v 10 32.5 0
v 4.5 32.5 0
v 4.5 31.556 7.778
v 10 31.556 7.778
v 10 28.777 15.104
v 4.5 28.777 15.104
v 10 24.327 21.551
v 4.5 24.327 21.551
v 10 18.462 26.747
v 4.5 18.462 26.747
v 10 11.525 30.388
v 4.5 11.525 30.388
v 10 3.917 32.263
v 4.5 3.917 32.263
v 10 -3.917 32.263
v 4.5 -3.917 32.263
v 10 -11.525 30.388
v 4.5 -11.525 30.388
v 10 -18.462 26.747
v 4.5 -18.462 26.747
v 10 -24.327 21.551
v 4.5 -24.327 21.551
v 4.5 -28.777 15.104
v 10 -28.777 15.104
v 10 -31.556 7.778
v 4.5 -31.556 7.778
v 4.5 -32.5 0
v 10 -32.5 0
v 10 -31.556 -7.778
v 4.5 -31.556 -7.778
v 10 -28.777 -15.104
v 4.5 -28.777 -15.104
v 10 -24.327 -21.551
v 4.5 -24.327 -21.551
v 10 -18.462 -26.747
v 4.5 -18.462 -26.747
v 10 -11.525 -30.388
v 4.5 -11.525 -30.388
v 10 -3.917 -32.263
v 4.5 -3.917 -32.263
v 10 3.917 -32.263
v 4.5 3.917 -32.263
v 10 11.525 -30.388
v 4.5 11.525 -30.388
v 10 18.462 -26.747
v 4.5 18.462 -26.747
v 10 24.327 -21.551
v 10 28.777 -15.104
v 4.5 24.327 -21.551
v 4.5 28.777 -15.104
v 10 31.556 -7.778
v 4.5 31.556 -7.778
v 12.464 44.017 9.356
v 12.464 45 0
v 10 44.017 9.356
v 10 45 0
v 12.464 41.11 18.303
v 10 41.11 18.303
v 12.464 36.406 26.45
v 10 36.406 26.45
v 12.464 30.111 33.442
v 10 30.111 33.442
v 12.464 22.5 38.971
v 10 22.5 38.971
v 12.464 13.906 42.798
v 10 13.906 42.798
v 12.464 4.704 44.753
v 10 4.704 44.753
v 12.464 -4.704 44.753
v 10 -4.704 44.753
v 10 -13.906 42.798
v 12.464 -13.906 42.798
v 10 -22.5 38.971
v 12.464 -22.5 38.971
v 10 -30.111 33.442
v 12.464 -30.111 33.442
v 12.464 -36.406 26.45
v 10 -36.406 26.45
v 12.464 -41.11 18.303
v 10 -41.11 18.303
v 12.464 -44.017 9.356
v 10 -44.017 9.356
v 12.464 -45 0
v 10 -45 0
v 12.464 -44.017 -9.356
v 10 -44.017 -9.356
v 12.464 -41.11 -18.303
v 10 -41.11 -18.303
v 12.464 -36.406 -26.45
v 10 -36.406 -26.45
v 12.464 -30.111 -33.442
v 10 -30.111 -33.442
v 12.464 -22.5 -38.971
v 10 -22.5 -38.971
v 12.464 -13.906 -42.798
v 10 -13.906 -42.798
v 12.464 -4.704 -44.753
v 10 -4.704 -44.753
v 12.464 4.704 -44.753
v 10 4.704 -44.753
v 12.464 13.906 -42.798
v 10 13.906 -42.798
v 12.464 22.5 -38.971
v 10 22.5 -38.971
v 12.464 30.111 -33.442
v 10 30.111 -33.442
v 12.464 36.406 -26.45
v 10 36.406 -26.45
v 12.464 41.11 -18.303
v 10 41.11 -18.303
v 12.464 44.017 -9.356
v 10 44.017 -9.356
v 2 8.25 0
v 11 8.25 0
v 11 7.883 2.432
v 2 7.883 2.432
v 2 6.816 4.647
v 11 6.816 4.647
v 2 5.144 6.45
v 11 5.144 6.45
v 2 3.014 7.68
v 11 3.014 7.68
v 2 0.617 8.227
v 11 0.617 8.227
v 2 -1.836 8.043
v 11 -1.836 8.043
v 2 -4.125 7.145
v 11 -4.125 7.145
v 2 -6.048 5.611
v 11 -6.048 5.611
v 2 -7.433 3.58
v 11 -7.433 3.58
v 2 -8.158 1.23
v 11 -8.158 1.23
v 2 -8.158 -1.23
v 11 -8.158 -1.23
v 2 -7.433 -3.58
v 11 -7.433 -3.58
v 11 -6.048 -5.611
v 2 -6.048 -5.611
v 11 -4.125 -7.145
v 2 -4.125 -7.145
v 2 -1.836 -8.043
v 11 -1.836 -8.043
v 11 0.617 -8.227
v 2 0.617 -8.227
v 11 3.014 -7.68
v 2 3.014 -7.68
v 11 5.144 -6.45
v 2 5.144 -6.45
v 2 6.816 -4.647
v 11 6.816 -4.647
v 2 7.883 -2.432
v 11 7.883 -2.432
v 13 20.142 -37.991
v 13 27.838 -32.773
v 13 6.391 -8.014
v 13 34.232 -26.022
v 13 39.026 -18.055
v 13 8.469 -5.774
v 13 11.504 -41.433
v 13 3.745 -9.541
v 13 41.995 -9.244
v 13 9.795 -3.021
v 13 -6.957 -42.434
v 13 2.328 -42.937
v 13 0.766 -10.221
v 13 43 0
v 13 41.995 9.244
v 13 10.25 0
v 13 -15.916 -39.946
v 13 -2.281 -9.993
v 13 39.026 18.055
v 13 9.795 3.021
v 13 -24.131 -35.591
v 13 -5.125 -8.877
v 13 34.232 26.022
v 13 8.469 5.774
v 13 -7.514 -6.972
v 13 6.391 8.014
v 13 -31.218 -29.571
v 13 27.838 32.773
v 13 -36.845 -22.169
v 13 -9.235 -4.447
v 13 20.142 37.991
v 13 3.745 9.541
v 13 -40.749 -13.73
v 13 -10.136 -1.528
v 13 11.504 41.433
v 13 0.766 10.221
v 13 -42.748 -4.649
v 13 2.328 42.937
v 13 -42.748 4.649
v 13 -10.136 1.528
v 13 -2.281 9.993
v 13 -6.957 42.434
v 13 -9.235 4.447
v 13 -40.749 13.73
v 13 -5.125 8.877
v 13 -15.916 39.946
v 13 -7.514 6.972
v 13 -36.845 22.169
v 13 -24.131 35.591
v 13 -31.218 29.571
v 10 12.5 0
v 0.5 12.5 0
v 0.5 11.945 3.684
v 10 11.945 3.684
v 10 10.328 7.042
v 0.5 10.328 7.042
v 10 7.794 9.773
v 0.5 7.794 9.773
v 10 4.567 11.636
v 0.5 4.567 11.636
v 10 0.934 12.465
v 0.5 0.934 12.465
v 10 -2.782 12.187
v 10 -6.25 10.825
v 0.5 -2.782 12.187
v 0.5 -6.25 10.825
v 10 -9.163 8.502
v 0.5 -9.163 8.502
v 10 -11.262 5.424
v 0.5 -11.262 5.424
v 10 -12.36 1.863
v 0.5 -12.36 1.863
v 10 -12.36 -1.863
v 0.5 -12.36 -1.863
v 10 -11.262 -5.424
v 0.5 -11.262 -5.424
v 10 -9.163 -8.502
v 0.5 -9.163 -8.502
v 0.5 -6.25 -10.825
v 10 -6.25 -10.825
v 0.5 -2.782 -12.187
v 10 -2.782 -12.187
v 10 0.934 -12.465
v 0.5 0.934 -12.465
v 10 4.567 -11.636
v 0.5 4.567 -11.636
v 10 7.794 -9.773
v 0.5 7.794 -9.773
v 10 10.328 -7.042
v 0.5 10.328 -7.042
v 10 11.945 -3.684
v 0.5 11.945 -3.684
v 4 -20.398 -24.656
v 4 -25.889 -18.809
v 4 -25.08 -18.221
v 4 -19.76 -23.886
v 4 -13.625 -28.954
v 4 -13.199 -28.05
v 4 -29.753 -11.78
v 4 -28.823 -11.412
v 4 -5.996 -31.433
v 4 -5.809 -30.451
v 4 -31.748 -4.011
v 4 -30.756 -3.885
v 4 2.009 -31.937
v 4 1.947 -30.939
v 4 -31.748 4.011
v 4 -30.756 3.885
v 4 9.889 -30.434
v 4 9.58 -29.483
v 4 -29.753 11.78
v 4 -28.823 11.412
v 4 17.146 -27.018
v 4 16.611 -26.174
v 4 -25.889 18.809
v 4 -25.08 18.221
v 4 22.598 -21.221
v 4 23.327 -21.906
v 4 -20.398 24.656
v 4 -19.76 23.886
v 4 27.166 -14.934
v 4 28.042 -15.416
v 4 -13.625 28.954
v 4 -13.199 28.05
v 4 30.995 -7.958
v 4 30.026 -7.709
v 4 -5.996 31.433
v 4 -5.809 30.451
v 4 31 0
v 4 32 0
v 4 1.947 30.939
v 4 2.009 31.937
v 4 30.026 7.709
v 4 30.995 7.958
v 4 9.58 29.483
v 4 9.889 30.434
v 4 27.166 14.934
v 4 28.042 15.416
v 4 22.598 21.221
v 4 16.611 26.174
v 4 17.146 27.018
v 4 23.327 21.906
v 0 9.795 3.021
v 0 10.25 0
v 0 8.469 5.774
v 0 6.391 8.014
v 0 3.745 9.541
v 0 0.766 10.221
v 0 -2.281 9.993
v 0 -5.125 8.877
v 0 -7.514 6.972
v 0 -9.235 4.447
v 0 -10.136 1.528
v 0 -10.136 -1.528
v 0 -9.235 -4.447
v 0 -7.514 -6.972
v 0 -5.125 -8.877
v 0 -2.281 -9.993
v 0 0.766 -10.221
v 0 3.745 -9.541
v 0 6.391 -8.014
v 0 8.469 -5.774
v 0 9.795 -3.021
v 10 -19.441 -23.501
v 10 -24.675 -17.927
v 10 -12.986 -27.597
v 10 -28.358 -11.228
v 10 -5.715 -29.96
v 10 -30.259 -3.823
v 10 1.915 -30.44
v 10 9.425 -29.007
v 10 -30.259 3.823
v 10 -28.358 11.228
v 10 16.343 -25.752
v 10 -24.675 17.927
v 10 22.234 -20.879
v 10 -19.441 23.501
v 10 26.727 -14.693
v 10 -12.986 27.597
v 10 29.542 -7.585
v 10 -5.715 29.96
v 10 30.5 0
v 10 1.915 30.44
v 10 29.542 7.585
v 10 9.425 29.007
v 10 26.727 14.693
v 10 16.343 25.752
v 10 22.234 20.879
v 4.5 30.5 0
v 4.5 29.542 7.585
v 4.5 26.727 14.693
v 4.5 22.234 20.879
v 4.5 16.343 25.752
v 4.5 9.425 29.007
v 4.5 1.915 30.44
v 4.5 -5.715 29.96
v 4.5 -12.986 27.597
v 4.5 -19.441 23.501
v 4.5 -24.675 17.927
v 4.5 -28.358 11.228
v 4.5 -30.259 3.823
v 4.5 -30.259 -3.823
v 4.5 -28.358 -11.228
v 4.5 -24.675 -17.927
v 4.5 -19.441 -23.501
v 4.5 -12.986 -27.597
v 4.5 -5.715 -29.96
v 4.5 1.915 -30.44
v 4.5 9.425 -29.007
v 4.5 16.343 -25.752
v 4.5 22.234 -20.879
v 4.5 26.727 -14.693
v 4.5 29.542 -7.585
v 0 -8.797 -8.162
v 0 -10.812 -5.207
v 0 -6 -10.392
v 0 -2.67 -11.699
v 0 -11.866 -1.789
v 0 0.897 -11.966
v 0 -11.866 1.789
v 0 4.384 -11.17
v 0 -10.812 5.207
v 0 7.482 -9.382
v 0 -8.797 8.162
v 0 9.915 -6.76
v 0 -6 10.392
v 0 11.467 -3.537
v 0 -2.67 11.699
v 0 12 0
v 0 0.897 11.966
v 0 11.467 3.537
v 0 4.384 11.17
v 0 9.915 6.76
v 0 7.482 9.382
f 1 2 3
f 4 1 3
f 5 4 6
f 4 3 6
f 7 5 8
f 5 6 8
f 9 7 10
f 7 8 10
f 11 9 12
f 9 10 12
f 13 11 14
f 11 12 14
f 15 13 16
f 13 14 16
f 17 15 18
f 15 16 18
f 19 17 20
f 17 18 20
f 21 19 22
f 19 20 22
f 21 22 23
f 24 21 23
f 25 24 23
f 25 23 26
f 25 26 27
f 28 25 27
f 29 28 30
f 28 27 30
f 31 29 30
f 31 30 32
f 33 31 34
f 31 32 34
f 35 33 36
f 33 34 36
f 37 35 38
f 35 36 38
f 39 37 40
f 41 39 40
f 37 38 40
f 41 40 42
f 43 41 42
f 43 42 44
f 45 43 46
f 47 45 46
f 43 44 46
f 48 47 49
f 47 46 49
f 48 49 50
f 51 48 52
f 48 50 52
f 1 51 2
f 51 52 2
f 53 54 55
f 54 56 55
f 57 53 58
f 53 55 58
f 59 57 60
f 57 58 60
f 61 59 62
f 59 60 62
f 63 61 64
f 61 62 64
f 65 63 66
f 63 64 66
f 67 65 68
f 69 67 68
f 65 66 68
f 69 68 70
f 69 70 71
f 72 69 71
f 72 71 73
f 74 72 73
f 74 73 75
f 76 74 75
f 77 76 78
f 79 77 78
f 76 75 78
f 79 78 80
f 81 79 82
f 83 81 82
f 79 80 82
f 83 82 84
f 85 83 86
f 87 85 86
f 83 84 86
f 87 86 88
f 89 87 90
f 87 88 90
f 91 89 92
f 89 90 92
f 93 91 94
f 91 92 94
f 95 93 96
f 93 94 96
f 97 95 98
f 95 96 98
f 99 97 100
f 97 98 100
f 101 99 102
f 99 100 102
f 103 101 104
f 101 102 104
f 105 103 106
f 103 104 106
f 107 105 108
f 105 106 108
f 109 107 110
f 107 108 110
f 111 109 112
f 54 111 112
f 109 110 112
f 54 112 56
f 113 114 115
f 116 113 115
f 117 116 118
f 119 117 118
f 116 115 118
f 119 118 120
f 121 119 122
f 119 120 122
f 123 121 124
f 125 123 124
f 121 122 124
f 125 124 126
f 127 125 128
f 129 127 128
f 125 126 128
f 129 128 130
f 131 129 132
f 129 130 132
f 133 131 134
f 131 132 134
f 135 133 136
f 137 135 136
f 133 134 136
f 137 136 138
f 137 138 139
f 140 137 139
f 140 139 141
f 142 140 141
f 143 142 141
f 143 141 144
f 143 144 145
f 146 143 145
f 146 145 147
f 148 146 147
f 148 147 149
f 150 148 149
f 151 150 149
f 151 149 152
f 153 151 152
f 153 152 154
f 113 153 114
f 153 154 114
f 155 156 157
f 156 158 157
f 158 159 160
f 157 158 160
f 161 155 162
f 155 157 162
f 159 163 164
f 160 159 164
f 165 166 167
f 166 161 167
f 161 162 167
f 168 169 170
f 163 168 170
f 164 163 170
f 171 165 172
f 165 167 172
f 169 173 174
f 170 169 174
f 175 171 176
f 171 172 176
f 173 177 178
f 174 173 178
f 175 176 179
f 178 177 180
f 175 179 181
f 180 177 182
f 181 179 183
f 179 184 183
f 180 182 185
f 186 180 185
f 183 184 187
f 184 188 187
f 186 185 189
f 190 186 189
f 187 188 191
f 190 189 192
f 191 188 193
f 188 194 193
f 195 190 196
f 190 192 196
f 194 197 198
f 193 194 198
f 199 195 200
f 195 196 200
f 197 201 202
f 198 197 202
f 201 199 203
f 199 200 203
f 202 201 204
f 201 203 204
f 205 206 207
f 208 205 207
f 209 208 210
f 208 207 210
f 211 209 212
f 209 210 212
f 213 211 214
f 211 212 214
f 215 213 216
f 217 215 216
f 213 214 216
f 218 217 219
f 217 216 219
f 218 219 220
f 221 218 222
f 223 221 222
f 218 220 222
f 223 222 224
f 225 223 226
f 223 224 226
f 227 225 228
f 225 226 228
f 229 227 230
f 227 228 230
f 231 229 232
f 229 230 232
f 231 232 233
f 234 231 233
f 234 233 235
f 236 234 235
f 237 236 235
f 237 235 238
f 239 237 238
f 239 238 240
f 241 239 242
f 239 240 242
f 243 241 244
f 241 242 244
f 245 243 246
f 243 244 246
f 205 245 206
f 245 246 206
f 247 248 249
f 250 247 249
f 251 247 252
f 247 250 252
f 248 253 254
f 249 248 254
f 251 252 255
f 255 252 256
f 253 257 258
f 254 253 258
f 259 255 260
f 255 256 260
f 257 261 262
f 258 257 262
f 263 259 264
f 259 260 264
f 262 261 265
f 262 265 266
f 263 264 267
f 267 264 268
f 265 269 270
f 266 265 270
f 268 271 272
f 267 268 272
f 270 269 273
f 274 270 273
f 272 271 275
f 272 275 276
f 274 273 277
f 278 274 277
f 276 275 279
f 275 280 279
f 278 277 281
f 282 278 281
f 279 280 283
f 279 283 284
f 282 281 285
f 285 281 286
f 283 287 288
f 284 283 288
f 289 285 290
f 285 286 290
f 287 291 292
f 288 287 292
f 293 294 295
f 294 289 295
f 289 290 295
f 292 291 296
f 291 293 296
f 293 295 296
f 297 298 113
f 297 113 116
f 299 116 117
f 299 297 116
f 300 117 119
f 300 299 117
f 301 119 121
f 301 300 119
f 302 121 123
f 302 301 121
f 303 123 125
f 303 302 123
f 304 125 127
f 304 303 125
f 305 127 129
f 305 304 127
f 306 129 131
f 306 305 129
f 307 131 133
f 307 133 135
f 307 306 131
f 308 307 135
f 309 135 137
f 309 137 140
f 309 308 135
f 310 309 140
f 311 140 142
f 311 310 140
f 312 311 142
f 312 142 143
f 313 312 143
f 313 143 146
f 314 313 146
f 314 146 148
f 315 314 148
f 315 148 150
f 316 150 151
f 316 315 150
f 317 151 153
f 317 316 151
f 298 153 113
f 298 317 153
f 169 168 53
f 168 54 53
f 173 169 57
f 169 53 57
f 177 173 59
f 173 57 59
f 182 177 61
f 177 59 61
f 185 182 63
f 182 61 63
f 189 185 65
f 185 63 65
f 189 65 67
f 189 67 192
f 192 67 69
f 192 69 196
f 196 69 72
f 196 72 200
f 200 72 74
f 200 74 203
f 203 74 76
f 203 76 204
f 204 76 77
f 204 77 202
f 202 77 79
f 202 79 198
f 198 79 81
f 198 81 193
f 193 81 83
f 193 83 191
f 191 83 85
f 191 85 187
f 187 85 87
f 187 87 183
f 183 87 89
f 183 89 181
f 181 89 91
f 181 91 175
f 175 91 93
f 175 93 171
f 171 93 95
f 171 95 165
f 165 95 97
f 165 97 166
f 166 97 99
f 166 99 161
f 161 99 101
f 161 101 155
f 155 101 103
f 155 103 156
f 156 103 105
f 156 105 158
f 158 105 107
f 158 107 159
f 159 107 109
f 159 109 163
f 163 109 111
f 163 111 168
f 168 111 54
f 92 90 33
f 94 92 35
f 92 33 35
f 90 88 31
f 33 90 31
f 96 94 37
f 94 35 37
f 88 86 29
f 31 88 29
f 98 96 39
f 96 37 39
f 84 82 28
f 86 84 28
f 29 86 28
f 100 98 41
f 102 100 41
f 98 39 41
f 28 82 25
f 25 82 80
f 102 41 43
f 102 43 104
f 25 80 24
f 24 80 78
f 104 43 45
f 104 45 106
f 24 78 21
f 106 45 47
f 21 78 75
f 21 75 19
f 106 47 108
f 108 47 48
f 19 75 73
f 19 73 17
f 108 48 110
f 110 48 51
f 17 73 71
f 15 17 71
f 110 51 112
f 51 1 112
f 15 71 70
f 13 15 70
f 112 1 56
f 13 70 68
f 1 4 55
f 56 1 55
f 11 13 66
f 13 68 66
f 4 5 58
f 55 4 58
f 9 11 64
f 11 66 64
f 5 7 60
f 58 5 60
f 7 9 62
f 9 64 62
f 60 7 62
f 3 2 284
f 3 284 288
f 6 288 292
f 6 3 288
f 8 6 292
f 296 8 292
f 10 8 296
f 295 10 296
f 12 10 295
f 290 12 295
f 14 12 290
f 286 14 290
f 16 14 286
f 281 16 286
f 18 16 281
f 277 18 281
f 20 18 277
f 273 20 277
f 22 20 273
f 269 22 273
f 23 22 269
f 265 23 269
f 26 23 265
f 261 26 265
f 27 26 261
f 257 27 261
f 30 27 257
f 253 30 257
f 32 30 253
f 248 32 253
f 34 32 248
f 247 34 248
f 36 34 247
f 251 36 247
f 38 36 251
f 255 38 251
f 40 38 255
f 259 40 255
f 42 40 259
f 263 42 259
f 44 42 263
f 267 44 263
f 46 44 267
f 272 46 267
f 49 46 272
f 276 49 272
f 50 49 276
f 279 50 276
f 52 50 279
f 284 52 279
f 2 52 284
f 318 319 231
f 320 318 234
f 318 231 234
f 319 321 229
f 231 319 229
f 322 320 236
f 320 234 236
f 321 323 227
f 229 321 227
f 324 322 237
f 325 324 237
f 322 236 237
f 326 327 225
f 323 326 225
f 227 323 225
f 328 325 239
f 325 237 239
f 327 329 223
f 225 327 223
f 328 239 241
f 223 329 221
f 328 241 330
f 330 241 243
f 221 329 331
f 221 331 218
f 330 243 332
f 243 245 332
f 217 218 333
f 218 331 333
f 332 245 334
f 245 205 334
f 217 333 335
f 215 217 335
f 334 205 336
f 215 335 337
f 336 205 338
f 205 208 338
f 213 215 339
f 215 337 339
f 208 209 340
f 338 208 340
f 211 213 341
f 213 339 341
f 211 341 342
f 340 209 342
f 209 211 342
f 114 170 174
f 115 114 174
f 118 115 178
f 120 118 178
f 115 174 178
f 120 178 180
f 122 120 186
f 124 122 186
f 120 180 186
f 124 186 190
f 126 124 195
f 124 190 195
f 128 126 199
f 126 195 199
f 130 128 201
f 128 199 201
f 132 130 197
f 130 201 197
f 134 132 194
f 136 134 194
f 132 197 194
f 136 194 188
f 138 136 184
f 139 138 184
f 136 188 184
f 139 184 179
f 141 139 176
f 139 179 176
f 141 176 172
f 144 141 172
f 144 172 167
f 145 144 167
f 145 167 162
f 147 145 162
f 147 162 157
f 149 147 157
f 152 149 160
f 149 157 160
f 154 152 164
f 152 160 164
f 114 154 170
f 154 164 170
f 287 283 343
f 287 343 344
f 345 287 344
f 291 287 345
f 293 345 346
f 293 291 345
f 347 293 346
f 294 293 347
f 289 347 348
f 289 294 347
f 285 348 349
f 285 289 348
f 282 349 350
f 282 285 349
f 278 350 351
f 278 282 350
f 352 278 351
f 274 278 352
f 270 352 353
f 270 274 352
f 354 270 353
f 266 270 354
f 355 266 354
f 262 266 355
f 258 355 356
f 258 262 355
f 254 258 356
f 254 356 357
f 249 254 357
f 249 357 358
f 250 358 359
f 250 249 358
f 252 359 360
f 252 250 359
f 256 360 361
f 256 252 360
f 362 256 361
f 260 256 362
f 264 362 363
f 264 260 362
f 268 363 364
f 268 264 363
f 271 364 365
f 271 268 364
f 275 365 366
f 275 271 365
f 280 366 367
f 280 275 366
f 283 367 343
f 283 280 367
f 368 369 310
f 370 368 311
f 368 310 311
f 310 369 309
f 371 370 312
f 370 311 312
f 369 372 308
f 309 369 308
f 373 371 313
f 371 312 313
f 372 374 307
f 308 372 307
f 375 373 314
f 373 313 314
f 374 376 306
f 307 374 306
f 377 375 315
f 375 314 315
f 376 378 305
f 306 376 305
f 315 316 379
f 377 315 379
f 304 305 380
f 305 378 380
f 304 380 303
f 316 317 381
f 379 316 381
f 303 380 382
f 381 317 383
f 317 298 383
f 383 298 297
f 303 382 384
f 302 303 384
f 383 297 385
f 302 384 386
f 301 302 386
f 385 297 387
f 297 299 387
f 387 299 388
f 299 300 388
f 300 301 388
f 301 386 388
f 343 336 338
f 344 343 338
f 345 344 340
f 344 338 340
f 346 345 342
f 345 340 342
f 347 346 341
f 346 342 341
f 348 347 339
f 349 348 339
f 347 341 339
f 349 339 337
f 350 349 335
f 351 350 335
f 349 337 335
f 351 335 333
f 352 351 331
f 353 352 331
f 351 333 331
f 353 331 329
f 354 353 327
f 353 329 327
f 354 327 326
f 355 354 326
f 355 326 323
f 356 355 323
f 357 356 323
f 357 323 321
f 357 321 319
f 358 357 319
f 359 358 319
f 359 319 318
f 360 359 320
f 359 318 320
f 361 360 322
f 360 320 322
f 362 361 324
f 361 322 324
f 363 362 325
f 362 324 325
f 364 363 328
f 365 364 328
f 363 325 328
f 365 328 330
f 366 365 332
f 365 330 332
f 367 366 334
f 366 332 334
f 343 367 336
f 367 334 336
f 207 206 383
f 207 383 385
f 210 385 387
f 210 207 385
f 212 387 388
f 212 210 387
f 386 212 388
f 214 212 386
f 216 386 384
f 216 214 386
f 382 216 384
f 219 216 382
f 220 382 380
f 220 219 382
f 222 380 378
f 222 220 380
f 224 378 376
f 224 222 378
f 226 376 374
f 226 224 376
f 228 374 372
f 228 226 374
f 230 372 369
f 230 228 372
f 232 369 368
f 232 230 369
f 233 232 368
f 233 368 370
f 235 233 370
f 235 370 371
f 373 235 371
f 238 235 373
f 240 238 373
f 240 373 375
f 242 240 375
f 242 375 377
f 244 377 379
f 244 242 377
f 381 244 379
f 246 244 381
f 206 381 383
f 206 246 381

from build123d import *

# Parameters (mm, degrees)
CHAMFER_1_SIZE = 2
CHAMFER_3_SIZE = 0.5


with BuildPart() as part:
    # Эскиз1 → Повернуть1 (revolve)
    with BuildSketch(Plane.XY):
        Polygon((0, 8.25), (13, 8.25), (13, 43), (12.464101615, 45), (10, 45), (10, 32.5), (4, 32.5), (4, 30.5), (10, 30.5), (10, 12.5), (0, 12.5), align=None)
    revolve(axis=Axis((0, 0, 0), (1, 0, 0)))

    # Фаска1
    chamfer_1_edges = [part.edges().sort_by_distance(p)[0] for p in [
        (13, -8.25, 0),
        (0, -8.25, 0),
    ]]
    chamfer(chamfer_1_edges, length=CHAMFER_1_SIZE)

    # Фаска3
    chamfer_3_edges = [part.edges().sort_by_distance(p)[0] for p in [
        (4, -30.5, 0),
        (4, -32.5, 0),
        (0, -12.5, 0),
    ]]
    chamfer(chamfer_3_edges, length=CHAMFER_3_SIZE)


solid = part.part
